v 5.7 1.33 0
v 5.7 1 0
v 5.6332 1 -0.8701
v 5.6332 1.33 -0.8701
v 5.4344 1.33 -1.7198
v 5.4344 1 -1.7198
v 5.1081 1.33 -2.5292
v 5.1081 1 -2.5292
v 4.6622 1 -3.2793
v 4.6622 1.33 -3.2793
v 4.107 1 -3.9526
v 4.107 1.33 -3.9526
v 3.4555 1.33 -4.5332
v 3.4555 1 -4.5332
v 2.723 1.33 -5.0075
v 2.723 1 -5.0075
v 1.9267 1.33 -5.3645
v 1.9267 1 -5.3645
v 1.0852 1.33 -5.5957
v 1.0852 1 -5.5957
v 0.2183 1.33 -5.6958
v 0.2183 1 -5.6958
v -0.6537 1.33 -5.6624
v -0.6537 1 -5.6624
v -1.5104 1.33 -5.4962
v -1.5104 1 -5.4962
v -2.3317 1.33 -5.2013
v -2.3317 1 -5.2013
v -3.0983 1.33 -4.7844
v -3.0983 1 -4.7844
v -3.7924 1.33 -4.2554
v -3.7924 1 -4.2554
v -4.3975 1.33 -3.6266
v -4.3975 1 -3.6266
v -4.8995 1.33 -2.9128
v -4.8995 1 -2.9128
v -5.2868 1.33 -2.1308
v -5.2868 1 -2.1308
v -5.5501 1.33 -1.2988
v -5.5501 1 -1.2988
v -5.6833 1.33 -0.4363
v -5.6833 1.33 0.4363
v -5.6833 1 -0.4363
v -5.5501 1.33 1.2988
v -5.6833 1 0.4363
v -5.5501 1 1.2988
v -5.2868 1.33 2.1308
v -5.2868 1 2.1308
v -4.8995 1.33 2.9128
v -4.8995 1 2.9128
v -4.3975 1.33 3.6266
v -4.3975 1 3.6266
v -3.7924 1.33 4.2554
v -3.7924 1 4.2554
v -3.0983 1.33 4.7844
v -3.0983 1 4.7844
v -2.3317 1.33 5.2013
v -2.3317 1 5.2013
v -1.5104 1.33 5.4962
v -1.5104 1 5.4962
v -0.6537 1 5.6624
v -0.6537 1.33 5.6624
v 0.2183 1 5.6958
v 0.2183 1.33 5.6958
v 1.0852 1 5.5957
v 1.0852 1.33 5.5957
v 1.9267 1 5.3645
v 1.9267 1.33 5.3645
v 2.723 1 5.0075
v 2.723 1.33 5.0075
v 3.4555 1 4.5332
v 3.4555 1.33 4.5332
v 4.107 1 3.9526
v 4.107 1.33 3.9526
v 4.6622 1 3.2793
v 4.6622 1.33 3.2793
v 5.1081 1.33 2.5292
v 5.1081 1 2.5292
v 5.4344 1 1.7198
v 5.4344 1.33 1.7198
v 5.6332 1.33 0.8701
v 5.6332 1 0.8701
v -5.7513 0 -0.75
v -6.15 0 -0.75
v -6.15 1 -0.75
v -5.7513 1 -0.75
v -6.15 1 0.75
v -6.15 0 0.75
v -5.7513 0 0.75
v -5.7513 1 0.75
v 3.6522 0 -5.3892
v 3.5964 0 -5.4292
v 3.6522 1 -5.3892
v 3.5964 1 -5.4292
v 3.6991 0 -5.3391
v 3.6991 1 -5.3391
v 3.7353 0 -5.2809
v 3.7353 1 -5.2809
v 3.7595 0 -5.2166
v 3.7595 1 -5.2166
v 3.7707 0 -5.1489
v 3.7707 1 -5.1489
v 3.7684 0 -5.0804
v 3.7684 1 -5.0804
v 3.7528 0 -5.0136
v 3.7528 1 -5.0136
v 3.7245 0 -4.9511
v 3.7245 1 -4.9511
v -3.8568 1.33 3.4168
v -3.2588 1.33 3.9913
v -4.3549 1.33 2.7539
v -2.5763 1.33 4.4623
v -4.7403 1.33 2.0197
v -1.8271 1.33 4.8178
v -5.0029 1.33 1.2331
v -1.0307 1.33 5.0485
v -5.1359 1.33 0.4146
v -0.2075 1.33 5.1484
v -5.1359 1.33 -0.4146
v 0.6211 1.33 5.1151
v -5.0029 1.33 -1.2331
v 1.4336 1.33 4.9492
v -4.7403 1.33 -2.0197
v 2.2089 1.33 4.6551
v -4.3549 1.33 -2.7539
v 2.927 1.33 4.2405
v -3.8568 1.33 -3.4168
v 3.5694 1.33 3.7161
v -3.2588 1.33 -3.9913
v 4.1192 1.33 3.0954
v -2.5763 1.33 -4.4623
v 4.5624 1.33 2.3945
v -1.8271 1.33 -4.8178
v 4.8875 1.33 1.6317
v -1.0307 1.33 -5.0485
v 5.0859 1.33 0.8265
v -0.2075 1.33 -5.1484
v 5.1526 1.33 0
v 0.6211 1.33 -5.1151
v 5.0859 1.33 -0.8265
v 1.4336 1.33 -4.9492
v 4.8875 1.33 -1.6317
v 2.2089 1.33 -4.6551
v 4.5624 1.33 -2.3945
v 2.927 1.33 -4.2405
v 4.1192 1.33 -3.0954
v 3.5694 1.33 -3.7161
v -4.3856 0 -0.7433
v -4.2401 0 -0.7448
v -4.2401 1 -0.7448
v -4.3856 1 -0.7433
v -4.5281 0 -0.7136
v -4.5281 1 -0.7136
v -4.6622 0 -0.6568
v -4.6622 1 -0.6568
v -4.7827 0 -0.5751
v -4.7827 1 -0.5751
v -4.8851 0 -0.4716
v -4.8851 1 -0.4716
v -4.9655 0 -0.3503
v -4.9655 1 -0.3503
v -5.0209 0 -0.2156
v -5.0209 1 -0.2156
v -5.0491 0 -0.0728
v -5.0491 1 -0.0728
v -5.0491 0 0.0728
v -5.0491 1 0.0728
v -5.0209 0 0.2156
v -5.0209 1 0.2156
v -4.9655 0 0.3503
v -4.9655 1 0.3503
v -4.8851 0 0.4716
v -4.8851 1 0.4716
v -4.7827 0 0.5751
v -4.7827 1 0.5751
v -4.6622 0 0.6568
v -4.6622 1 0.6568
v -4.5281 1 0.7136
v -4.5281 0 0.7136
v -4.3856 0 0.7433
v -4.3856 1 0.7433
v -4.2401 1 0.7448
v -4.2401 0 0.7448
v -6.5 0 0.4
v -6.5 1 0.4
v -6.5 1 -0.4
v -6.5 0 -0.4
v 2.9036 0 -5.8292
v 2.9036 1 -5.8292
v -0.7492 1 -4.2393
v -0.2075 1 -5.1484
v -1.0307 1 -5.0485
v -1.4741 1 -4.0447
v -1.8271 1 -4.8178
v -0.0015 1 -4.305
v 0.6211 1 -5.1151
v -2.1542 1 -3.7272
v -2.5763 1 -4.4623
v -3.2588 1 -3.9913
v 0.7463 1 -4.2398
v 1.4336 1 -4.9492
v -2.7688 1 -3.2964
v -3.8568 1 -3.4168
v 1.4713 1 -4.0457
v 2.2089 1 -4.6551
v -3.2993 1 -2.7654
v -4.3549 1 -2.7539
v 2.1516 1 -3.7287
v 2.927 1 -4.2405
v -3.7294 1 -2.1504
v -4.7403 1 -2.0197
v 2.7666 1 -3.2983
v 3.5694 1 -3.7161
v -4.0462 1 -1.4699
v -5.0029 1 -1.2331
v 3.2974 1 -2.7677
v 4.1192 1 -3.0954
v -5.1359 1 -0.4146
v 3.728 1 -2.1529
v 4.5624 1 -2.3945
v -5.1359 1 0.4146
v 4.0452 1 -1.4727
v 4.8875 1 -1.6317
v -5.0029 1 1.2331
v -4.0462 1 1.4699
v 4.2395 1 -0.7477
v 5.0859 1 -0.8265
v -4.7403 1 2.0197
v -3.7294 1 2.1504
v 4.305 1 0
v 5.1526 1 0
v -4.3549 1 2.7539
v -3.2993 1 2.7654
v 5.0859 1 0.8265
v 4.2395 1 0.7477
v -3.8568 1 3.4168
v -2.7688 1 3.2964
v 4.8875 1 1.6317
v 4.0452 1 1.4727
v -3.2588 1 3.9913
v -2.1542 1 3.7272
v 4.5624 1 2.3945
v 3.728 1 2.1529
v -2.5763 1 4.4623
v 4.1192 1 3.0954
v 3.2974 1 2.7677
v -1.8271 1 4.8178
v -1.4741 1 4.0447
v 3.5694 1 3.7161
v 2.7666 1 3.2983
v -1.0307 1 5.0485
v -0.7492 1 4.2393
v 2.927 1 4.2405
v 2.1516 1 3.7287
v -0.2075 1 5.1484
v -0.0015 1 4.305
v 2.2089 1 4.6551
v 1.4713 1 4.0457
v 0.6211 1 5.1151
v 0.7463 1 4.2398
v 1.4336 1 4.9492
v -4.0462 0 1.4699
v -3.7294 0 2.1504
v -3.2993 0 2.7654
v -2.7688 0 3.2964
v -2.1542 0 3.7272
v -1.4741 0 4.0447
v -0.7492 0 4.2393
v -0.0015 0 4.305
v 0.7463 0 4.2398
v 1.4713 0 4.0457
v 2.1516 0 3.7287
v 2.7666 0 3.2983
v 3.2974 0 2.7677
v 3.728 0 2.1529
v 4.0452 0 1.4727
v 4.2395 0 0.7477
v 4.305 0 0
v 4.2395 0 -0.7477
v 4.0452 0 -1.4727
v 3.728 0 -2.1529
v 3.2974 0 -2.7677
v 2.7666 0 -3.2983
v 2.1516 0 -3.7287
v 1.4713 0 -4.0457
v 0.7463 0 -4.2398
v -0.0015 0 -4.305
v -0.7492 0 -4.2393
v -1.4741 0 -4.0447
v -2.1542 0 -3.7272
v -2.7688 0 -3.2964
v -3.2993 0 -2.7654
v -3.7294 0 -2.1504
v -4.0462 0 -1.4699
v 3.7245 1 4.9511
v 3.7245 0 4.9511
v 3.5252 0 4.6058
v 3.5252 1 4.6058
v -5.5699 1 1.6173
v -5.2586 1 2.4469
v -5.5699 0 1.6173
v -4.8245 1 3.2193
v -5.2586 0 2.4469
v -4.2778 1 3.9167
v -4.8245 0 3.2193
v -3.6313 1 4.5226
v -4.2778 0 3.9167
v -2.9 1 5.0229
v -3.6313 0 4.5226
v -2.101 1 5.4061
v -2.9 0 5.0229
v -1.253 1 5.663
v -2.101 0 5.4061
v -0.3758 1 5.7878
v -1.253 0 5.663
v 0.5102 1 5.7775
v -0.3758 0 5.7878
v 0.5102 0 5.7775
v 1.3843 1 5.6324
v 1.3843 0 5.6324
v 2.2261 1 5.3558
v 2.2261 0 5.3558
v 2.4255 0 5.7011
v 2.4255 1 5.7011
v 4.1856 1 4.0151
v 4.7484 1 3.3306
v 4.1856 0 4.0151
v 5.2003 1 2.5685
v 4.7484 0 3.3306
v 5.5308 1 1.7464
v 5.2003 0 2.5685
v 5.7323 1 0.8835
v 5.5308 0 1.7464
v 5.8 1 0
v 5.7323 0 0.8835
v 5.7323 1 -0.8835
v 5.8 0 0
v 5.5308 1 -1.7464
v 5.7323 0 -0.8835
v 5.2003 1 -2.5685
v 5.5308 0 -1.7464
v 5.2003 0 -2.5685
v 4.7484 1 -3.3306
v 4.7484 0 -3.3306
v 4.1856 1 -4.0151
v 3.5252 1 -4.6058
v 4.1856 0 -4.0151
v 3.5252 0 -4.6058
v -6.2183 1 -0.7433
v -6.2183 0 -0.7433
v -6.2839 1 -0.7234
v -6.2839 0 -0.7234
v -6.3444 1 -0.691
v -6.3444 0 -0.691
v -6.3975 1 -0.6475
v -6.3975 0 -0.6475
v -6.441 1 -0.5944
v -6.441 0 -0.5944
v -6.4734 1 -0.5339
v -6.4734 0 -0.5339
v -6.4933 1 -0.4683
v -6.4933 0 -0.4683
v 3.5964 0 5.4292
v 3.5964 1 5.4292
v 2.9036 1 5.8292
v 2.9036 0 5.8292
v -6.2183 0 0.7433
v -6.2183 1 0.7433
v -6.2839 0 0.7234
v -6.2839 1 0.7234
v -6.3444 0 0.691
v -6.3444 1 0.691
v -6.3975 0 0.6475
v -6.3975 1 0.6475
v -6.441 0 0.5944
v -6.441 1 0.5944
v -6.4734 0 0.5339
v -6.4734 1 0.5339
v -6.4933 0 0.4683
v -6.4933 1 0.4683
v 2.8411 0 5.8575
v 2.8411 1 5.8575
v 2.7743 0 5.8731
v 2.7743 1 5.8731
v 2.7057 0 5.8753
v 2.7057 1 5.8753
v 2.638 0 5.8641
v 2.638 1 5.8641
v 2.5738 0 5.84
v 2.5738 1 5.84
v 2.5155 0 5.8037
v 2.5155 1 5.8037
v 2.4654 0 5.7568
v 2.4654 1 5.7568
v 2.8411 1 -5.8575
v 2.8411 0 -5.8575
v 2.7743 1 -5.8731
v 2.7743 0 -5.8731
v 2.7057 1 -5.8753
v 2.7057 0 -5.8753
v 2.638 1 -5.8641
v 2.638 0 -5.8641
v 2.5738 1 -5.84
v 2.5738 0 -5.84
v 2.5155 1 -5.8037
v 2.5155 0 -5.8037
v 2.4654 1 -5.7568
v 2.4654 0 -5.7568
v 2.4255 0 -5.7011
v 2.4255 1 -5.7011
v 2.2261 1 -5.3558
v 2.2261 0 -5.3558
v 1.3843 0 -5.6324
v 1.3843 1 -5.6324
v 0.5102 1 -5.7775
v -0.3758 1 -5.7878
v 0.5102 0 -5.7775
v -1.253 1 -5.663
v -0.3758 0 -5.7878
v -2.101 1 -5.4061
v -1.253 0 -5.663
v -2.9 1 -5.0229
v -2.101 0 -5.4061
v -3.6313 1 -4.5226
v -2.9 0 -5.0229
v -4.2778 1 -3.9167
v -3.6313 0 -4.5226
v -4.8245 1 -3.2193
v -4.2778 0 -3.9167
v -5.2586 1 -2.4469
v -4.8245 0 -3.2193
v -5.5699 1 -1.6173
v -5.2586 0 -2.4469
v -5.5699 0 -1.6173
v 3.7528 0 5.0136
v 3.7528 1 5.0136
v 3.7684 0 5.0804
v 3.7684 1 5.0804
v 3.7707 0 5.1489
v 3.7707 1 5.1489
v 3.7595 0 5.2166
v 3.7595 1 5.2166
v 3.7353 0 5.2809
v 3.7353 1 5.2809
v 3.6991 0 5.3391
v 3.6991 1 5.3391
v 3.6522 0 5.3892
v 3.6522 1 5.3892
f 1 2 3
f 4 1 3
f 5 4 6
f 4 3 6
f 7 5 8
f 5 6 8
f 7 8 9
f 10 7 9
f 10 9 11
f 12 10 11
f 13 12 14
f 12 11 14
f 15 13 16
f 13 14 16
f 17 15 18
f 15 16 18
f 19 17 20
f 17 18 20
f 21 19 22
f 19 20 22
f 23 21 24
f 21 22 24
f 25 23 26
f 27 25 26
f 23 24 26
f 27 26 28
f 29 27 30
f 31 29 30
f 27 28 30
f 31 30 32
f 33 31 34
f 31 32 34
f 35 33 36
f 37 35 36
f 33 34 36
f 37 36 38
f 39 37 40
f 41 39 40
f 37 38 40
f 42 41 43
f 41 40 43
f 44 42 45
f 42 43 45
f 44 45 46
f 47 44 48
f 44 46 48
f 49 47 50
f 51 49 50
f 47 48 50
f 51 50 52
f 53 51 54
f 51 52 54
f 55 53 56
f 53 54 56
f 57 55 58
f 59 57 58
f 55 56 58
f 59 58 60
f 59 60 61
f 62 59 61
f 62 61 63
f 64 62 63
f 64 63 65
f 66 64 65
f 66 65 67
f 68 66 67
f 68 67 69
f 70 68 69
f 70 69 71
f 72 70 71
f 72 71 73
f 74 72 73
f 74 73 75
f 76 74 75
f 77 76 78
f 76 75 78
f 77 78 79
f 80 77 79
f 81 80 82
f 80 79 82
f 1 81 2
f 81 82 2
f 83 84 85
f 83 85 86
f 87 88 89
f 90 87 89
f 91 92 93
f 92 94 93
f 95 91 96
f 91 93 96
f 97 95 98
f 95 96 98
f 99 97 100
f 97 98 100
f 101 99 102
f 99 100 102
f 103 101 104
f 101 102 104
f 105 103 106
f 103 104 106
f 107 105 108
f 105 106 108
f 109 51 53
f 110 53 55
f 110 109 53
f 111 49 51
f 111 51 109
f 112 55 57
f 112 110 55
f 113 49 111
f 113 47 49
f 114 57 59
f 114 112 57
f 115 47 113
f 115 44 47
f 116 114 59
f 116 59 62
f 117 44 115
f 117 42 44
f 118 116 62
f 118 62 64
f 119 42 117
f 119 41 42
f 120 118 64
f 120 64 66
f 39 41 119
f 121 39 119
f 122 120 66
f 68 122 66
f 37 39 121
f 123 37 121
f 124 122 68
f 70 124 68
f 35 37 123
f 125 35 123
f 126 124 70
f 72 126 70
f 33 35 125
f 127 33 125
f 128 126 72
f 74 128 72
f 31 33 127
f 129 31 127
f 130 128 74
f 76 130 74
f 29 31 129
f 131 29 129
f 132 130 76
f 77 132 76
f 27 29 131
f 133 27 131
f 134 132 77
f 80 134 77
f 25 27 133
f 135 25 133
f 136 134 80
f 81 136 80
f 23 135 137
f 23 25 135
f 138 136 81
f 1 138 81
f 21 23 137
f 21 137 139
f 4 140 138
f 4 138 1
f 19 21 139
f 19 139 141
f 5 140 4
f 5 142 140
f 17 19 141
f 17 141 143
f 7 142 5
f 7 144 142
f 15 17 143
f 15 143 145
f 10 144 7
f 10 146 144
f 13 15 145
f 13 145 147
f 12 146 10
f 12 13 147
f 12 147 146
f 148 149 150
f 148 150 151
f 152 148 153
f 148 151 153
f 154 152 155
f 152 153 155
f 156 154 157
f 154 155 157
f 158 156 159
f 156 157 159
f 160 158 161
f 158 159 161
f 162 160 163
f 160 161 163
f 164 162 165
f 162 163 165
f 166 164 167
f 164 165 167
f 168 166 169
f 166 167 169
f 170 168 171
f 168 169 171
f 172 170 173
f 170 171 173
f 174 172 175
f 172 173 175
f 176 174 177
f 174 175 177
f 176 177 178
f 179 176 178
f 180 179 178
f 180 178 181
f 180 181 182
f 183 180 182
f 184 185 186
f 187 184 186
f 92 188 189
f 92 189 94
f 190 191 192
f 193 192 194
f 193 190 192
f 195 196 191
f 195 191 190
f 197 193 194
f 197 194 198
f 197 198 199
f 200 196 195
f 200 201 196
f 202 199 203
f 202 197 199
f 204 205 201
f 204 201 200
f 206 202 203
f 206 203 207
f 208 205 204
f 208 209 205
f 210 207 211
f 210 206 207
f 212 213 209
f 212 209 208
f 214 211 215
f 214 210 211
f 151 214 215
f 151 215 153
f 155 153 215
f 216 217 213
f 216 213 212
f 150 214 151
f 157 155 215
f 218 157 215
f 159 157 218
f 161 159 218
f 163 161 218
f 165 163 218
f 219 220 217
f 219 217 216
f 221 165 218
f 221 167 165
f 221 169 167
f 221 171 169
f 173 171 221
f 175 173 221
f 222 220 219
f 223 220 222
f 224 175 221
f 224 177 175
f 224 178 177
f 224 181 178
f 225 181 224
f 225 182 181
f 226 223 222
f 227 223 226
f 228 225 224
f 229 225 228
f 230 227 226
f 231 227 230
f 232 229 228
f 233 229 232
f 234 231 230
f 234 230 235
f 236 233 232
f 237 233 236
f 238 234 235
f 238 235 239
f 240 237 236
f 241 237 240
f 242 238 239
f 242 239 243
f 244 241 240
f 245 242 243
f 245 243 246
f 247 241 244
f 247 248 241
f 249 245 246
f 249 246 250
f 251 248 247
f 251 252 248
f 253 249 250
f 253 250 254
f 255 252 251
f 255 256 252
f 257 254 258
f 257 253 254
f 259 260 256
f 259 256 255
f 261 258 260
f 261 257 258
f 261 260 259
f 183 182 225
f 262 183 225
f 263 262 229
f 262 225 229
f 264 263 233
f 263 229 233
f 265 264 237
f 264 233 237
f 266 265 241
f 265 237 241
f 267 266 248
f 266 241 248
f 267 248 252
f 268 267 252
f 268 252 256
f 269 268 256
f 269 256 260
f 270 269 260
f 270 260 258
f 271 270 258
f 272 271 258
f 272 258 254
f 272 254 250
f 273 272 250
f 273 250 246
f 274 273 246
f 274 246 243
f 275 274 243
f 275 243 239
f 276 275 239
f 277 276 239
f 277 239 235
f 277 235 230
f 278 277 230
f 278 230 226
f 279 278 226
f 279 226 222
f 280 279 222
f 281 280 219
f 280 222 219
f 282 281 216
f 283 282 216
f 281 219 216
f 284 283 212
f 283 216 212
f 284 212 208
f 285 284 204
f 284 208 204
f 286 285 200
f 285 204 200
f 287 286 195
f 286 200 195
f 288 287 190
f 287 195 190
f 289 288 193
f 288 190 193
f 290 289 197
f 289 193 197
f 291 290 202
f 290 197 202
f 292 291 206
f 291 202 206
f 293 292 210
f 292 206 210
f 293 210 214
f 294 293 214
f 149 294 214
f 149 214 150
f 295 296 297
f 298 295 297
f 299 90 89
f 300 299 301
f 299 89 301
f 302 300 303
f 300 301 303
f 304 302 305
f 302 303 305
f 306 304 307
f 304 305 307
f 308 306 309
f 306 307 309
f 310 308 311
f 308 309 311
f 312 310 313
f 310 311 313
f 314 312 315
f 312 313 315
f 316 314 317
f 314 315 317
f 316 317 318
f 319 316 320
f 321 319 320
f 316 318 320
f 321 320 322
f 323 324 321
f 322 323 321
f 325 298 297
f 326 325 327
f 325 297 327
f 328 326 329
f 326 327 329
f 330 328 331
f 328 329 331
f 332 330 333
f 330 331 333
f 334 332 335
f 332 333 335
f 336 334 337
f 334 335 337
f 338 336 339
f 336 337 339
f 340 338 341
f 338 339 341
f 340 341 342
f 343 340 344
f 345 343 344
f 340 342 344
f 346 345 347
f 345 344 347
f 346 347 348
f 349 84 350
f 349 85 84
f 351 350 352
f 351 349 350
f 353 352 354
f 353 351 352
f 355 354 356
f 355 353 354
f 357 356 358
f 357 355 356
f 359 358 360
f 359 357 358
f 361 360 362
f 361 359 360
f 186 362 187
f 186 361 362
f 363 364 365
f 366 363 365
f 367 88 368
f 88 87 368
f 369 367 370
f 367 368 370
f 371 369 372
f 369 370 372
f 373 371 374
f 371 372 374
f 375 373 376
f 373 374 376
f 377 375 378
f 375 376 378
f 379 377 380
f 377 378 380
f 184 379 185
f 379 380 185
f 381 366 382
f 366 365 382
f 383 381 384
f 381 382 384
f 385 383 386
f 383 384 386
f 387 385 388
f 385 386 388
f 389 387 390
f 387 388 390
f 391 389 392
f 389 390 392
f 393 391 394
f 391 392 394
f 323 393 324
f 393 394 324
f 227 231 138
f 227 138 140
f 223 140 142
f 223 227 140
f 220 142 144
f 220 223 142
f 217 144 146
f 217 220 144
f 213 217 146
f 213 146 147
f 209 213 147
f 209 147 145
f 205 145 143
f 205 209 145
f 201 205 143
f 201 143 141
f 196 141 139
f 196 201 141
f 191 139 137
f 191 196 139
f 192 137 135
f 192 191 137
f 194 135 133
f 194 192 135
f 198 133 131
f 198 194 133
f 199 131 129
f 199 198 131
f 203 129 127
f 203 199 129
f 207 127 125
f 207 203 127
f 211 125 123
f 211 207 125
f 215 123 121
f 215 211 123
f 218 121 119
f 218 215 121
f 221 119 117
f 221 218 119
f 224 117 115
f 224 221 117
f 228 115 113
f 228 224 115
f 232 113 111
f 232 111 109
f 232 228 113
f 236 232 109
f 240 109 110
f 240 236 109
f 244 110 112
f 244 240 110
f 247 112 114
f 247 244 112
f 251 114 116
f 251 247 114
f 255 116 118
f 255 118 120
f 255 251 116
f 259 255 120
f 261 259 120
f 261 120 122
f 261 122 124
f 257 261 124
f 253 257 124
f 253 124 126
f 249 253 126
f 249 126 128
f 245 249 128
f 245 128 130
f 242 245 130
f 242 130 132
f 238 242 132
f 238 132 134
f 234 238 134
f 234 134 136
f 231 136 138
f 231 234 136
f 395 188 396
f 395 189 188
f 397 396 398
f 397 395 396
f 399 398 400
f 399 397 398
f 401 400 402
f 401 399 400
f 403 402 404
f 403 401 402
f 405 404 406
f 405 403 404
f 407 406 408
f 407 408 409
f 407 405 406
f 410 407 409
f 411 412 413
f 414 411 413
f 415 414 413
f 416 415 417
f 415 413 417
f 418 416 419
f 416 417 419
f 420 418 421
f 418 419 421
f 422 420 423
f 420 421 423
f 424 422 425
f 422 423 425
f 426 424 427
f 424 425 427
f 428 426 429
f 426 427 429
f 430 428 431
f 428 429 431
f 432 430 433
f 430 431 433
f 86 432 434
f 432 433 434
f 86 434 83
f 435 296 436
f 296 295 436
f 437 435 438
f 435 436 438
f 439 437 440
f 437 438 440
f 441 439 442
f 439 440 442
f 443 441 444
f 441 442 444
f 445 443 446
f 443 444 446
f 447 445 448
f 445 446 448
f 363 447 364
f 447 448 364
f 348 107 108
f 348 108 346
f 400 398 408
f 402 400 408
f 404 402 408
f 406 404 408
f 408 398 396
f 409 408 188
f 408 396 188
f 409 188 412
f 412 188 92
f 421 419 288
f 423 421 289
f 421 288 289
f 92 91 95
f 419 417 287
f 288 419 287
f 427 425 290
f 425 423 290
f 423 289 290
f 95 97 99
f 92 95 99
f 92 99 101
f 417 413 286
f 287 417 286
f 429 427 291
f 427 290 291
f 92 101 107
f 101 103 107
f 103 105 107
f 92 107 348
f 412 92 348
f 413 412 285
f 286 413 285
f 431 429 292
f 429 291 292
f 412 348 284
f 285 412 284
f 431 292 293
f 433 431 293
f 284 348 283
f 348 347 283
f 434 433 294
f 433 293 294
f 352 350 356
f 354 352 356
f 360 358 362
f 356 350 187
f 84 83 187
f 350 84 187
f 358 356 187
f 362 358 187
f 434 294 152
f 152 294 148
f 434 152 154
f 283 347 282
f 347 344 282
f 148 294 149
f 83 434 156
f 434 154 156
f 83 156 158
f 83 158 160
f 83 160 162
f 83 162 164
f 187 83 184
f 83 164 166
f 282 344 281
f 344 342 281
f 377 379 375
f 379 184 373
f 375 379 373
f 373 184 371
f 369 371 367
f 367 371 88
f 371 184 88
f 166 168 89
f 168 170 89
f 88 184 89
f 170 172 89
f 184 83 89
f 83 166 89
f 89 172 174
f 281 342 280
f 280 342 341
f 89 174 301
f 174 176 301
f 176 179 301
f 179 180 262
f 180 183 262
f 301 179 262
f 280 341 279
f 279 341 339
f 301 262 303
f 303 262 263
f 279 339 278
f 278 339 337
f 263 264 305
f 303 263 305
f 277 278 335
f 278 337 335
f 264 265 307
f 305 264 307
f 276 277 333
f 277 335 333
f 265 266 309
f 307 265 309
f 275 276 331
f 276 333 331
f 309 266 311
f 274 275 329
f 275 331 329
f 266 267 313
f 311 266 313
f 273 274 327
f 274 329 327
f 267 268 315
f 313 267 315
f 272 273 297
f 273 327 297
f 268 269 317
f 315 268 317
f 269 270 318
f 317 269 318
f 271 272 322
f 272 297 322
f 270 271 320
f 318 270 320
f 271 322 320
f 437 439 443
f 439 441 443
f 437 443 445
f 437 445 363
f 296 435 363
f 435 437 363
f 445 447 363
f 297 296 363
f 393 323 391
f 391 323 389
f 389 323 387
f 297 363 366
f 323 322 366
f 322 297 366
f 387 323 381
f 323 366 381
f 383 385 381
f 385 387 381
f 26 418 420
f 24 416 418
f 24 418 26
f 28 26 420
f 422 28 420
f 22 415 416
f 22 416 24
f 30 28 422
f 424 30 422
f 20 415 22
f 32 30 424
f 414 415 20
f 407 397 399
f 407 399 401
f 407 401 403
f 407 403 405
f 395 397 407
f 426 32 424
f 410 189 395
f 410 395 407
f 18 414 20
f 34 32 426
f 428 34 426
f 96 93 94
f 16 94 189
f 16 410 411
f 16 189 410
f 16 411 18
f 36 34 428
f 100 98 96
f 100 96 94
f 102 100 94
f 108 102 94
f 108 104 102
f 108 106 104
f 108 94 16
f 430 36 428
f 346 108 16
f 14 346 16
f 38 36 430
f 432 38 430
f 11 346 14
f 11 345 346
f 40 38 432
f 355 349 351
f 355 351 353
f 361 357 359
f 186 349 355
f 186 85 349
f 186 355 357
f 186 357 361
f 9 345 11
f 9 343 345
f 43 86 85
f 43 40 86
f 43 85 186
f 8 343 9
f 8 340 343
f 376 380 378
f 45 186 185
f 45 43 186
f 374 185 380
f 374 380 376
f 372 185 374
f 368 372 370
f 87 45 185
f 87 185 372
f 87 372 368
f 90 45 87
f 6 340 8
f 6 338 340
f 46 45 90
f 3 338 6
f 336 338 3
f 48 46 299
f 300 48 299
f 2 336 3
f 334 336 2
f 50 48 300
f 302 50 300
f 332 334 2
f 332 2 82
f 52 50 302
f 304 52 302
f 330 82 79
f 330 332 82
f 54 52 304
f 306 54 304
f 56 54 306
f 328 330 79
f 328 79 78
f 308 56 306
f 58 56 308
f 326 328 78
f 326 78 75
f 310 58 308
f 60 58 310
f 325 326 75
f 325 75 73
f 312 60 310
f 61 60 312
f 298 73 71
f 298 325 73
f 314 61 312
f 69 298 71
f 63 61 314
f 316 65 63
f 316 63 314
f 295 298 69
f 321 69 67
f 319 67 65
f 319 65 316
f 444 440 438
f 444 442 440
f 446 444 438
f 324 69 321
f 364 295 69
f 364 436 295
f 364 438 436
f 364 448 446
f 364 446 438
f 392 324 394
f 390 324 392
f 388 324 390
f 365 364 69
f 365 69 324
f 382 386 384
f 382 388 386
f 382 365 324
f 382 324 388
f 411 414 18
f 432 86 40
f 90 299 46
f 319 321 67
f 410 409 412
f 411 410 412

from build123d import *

# Parameters (mm, degrees)
SKIZZE1_R                       = 5.8
AUFSATZ_LINEAR_AUSTRAGEN1_DEPTH = 1
SKIZZE1_3_W                     = 1.261937381
SKIZZE1_3_H                     = 1.5
AUFSATZ_LINEAR_AUSTRAGEN2_DEPTH = 1
SKIZZE4_R                       = 4.304974062
SCHNITT_LINEAR_AUSTRAGEN1_DEPTH = 1
SKIZZE5_R                       = 0.747652737
SCHNITT_LINEAR_AUSTRAGEN2_DEPTH = 1
KREISMUSTER1_COUNT              = 3
VERRUNDUNG2_R                   = 0.35
SKIZZE6_R                       = 5.7
SKIZZE6_R_2                     = 5.1526268
AUFSATZ_LINEAR_AUSTRAGEN3_DEPTH = 0.33


with BuildPart() as part:
    # Skizze1 → Aufsatz-Linear austragen1 (new body)
    with BuildSketch(Plane(origin=(0, 0, 0), x_dir=(1, 0, 0), z_dir=(0, 1, 0))):
        Circle(SKIZZE1_R)
    extrude(amount=AUFSATZ_LINEAR_AUSTRAGEN1_DEPTH)

    # Skizze1<3> → Aufsatz-Linear austragen2 (add)
    with BuildSketch(Plane(origin=(0, 0, 0), x_dir=(1, 0, 0), z_dir=(0, 1, 0))):
        with Locations((-5.86903131, 0)):
            Rectangle(SKIZZE1_3_W, SKIZZE1_3_H)
    aufsatz_linear_austragen2 = extrude(amount=AUFSATZ_LINEAR_AUSTRAGEN2_DEPTH)

    # Skizze4 → Schnitt-Linear austragen1 (cut)
    with BuildSketch(Plane(origin=(0, 1, 0), x_dir=(1, 0, 0), z_dir=(0, 1, 0))):
        Circle(SKIZZE4_R)
    extrude(amount=-SCHNITT_LINEAR_AUSTRAGEN1_DEPTH, mode=Mode.SUBTRACT)

    # Skizze5 → Schnitt-Linear austragen2 (cut)
    with BuildSketch(Plane(origin=(0, 1, 0), x_dir=(1, 0, 0), z_dir=(0, 1, 0))):
        with Locations((-4.304974062, 0)):
            Circle(SKIZZE5_R)
    extrude(amount=-SCHNITT_LINEAR_AUSTRAGEN2_DEPTH, mode=Mode.SUBTRACT)

    # Kreismuster1: Aufsatz-Linear austragen2 ×3 about axis
    kreismuster1_axis = Axis((0, 0, 0), (0, 1, 0))
    for i in range(1, KREISMUSTER1_COUNT):
        add(aufsatz_linear_austragen2.rotate(kreismuster1_axis, i * 360 / KREISMUSTER1_COUNT))

    # Verrundung2
    verrundung2_edges = [part.edges().sort_by_distance(p)[0] for p in [
        (-6.5, 0.5, 0.75),
        (-6.5, 0.5, -0.75),
        (3.899519053, 0.5, 5.254165125),
        (2.600480947, 0.5, 6.004165125),
        (2.600480947, 0.5, -6.004165125),
        (3.899519053, 0.5, -5.254165125),
    ]]
    fillet(verrundung2_edges, radius=VERRUNDUNG2_R)

    # Skizze6 → Aufsatz-Linear austragen3 (add)
    with BuildSketch(Plane(origin=(0, 1, 0), x_dir=(1, 0, 0), z_dir=(0, 1, 0))):
        Circle(SKIZZE6_R)
        Circle(SKIZZE6_R_2, mode=Mode.SUBTRACT)
    extrude(amount=AUFSATZ_LINEAR_AUSTRAGEN3_DEPTH)


solid = part.part
